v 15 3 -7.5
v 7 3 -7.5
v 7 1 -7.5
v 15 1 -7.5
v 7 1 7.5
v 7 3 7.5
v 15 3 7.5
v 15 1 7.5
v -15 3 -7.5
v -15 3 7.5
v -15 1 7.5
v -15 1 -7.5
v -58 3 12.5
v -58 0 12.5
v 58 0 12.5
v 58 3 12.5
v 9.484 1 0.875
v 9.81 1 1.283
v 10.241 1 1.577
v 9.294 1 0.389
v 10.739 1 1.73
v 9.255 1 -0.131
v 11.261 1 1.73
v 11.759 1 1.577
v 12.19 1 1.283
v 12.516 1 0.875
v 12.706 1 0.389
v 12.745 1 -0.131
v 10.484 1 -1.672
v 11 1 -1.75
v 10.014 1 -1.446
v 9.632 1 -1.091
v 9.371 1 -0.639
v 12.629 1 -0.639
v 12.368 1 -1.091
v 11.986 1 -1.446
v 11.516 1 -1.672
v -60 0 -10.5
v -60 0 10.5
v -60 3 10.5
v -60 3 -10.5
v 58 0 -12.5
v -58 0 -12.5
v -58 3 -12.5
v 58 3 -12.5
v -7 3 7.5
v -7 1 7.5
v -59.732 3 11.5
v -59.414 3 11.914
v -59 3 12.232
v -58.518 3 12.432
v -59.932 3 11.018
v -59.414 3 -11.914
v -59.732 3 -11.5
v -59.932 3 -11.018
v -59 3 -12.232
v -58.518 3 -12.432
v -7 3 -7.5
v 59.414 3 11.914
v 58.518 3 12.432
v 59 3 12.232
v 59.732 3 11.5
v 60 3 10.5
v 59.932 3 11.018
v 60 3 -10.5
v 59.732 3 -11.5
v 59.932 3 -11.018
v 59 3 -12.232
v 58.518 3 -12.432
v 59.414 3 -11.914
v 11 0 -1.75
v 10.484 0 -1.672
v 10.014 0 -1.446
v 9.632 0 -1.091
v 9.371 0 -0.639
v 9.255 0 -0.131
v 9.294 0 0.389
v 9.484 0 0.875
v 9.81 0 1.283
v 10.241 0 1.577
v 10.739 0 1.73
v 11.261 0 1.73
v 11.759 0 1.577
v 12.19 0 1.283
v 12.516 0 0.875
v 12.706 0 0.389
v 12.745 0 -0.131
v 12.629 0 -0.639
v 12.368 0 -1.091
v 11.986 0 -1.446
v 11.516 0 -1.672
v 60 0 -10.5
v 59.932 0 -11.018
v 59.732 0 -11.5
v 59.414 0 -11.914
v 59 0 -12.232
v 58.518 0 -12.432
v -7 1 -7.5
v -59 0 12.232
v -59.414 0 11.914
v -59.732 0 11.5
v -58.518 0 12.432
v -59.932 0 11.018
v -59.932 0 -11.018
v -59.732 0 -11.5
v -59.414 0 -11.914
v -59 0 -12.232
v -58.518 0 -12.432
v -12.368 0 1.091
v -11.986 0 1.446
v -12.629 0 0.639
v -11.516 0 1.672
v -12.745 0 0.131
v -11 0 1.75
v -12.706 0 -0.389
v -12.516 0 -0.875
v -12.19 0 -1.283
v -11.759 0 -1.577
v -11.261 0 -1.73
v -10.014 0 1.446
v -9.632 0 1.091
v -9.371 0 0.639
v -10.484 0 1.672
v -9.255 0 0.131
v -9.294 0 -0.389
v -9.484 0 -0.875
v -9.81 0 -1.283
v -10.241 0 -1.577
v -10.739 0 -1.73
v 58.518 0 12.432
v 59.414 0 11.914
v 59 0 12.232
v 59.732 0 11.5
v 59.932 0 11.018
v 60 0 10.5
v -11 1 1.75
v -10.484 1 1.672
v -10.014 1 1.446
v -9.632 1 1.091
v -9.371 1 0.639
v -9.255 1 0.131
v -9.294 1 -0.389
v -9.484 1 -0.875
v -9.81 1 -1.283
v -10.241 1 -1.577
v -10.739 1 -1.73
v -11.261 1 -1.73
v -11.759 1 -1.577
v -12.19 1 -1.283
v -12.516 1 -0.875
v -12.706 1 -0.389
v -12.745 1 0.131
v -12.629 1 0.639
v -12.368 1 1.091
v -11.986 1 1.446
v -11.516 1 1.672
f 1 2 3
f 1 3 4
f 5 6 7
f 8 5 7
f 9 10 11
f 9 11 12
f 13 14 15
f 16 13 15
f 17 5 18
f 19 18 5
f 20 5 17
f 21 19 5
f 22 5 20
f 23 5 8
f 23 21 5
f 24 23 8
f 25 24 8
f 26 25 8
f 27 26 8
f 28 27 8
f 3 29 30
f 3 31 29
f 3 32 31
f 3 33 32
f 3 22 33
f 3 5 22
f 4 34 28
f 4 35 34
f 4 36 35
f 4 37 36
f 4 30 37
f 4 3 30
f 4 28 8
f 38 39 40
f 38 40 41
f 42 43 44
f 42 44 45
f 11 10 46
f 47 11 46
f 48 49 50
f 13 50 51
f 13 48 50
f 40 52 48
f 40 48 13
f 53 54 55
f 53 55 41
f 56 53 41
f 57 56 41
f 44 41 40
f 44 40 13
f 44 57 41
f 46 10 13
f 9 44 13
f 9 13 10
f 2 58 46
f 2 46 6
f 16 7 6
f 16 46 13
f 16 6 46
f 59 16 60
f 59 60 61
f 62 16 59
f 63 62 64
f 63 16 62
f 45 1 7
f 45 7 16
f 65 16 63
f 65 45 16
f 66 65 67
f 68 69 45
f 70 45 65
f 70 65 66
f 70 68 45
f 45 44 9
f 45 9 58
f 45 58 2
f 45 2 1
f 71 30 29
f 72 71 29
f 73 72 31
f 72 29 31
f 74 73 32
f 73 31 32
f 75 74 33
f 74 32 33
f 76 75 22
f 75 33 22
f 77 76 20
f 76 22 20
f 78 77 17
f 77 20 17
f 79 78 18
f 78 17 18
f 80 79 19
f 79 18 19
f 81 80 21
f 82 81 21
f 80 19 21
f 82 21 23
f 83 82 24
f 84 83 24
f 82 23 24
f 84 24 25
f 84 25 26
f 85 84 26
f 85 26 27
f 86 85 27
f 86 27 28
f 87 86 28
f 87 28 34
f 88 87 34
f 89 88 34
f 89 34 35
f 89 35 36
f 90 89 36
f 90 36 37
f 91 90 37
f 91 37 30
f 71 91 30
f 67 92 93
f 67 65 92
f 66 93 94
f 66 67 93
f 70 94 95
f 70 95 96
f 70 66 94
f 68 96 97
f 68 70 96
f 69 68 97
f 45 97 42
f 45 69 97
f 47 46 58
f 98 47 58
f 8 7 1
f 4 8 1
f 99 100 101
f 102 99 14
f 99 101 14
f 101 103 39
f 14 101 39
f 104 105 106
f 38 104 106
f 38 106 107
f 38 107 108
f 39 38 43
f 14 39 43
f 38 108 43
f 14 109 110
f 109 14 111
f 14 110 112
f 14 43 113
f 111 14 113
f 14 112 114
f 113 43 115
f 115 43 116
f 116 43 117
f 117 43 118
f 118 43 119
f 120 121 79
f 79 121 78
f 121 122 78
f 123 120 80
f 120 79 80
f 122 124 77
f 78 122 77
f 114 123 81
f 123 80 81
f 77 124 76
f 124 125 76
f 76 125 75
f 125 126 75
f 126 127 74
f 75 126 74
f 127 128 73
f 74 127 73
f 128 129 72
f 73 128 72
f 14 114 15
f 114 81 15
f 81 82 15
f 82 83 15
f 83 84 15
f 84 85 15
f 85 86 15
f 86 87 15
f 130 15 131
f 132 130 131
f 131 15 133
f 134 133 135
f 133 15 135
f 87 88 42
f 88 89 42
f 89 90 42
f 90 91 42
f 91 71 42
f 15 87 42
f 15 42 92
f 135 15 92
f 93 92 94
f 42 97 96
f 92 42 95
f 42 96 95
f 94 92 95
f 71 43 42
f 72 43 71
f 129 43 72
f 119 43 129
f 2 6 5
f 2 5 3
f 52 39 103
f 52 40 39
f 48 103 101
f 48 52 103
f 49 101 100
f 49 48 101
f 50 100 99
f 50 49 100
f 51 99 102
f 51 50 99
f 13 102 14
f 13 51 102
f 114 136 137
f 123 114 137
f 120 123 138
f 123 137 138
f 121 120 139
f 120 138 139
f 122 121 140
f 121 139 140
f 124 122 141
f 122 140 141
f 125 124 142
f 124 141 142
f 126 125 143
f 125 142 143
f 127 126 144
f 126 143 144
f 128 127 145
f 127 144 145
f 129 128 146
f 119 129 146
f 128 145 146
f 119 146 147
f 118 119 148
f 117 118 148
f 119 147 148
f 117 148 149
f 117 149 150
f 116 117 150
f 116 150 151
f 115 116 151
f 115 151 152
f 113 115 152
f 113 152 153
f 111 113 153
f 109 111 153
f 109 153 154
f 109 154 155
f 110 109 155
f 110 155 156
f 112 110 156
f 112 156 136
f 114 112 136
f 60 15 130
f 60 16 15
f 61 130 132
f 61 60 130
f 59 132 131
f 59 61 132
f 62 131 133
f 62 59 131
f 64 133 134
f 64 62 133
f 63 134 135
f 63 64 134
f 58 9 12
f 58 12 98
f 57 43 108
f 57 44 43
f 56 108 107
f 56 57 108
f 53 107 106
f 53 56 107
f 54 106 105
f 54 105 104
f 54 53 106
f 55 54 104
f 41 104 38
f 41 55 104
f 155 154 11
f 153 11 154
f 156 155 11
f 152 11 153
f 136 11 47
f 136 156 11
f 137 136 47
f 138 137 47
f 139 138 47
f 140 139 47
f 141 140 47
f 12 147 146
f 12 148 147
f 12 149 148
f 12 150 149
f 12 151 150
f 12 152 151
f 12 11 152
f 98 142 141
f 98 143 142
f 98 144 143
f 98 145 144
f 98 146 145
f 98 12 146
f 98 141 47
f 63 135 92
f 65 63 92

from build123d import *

# Parameters (mm, degrees)
TOP_COVER_W         = 120
TOP_COVER_H         = 25
BOSS_EXTRUDE1_DEPTH = 3
ATTACHMENT_POINT_W  = 8
ATTACHMENT_POINT_H  = 15
CUT_EXTRUDE1_DEPTH  = 2
SKETCH4_R           = 1.75
M3_SCREW_CUT_DEPTH  = 62.361632964
FILLET1_R           = 2
FILLET2_R           = 2
FILLET3_R           = 2
FILLET4_R           = 2


with BuildPart() as part:
    # Top Cover → Boss-Extrude1 (new body)
    with BuildSketch(Plane(origin=(0, 0, 0), x_dir=(1, 0, 0), z_dir=(0, 1, 0))):
        Rectangle(TOP_COVER_W, TOP_COVER_H)
    extrude(amount=BOSS_EXTRUDE1_DEPTH)

    # Attachment Point → Cut-Extrude1 (cut)
    with BuildSketch(Plane(origin=(0, 3, 0), x_dir=(1, 0, 0), z_dir=(0, 1, 0))):
        with Locations((-11, 0)):
            Rectangle(ATTACHMENT_POINT_W, ATTACHMENT_POINT_H)
        with Locations((11, 0)):
            Rectangle(ATTACHMENT_POINT_W, ATTACHMENT_POINT_H)
    extrude(amount=-CUT_EXTRUDE1_DEPTH, mode=Mode.SUBTRACT)

    # Sketch4 → M3 Screw CUT (cut, through all)
    with BuildSketch(Plane(origin=(0, 3, 0), x_dir=(1, 0, 0), z_dir=(0, 1, 0))):
        with Locations(Location((-11, 0, 0), (0, 0, 270))):
            Circle(SKETCH4_R)
        with Locations(Location((11, 0, 0), (0, 0, 90))):
            Circle(SKETCH4_R)
    extrude(amount=-M3_SCREW_CUT_DEPTH, mode=Mode.SUBTRACT)

    # Fillet1
    fillet1_edges = [part.edges().sort_by_distance(p)[0] for p in [
        (-60, 1.5, 12.5),
    ]]
    fillet(fillet1_edges, radius=FILLET1_R)

    # Fillet2
    fillet2_edges = [part.edges().sort_by_distance(p)[0] for p in [
        (60, 1.5, 12.5),
    ]]
    fillet(fillet2_edges, radius=FILLET2_R)

    # Fillet3
    fillet3_edges = [part.edges().sort_by_distance(p)[0] for p in [
        (60, 1.5, -12.5),
    ]]
    fillet(fillet3_edges, radius=FILLET3_R)

    # Fillet4
    fillet4_edges = [part.edges().sort_by_distance(p)[0] for p in [
        (-60, 1.5, -12.5),
    ]]
    fillet(fillet4_edges, radius=FILLET4_R)


solid = part.part
